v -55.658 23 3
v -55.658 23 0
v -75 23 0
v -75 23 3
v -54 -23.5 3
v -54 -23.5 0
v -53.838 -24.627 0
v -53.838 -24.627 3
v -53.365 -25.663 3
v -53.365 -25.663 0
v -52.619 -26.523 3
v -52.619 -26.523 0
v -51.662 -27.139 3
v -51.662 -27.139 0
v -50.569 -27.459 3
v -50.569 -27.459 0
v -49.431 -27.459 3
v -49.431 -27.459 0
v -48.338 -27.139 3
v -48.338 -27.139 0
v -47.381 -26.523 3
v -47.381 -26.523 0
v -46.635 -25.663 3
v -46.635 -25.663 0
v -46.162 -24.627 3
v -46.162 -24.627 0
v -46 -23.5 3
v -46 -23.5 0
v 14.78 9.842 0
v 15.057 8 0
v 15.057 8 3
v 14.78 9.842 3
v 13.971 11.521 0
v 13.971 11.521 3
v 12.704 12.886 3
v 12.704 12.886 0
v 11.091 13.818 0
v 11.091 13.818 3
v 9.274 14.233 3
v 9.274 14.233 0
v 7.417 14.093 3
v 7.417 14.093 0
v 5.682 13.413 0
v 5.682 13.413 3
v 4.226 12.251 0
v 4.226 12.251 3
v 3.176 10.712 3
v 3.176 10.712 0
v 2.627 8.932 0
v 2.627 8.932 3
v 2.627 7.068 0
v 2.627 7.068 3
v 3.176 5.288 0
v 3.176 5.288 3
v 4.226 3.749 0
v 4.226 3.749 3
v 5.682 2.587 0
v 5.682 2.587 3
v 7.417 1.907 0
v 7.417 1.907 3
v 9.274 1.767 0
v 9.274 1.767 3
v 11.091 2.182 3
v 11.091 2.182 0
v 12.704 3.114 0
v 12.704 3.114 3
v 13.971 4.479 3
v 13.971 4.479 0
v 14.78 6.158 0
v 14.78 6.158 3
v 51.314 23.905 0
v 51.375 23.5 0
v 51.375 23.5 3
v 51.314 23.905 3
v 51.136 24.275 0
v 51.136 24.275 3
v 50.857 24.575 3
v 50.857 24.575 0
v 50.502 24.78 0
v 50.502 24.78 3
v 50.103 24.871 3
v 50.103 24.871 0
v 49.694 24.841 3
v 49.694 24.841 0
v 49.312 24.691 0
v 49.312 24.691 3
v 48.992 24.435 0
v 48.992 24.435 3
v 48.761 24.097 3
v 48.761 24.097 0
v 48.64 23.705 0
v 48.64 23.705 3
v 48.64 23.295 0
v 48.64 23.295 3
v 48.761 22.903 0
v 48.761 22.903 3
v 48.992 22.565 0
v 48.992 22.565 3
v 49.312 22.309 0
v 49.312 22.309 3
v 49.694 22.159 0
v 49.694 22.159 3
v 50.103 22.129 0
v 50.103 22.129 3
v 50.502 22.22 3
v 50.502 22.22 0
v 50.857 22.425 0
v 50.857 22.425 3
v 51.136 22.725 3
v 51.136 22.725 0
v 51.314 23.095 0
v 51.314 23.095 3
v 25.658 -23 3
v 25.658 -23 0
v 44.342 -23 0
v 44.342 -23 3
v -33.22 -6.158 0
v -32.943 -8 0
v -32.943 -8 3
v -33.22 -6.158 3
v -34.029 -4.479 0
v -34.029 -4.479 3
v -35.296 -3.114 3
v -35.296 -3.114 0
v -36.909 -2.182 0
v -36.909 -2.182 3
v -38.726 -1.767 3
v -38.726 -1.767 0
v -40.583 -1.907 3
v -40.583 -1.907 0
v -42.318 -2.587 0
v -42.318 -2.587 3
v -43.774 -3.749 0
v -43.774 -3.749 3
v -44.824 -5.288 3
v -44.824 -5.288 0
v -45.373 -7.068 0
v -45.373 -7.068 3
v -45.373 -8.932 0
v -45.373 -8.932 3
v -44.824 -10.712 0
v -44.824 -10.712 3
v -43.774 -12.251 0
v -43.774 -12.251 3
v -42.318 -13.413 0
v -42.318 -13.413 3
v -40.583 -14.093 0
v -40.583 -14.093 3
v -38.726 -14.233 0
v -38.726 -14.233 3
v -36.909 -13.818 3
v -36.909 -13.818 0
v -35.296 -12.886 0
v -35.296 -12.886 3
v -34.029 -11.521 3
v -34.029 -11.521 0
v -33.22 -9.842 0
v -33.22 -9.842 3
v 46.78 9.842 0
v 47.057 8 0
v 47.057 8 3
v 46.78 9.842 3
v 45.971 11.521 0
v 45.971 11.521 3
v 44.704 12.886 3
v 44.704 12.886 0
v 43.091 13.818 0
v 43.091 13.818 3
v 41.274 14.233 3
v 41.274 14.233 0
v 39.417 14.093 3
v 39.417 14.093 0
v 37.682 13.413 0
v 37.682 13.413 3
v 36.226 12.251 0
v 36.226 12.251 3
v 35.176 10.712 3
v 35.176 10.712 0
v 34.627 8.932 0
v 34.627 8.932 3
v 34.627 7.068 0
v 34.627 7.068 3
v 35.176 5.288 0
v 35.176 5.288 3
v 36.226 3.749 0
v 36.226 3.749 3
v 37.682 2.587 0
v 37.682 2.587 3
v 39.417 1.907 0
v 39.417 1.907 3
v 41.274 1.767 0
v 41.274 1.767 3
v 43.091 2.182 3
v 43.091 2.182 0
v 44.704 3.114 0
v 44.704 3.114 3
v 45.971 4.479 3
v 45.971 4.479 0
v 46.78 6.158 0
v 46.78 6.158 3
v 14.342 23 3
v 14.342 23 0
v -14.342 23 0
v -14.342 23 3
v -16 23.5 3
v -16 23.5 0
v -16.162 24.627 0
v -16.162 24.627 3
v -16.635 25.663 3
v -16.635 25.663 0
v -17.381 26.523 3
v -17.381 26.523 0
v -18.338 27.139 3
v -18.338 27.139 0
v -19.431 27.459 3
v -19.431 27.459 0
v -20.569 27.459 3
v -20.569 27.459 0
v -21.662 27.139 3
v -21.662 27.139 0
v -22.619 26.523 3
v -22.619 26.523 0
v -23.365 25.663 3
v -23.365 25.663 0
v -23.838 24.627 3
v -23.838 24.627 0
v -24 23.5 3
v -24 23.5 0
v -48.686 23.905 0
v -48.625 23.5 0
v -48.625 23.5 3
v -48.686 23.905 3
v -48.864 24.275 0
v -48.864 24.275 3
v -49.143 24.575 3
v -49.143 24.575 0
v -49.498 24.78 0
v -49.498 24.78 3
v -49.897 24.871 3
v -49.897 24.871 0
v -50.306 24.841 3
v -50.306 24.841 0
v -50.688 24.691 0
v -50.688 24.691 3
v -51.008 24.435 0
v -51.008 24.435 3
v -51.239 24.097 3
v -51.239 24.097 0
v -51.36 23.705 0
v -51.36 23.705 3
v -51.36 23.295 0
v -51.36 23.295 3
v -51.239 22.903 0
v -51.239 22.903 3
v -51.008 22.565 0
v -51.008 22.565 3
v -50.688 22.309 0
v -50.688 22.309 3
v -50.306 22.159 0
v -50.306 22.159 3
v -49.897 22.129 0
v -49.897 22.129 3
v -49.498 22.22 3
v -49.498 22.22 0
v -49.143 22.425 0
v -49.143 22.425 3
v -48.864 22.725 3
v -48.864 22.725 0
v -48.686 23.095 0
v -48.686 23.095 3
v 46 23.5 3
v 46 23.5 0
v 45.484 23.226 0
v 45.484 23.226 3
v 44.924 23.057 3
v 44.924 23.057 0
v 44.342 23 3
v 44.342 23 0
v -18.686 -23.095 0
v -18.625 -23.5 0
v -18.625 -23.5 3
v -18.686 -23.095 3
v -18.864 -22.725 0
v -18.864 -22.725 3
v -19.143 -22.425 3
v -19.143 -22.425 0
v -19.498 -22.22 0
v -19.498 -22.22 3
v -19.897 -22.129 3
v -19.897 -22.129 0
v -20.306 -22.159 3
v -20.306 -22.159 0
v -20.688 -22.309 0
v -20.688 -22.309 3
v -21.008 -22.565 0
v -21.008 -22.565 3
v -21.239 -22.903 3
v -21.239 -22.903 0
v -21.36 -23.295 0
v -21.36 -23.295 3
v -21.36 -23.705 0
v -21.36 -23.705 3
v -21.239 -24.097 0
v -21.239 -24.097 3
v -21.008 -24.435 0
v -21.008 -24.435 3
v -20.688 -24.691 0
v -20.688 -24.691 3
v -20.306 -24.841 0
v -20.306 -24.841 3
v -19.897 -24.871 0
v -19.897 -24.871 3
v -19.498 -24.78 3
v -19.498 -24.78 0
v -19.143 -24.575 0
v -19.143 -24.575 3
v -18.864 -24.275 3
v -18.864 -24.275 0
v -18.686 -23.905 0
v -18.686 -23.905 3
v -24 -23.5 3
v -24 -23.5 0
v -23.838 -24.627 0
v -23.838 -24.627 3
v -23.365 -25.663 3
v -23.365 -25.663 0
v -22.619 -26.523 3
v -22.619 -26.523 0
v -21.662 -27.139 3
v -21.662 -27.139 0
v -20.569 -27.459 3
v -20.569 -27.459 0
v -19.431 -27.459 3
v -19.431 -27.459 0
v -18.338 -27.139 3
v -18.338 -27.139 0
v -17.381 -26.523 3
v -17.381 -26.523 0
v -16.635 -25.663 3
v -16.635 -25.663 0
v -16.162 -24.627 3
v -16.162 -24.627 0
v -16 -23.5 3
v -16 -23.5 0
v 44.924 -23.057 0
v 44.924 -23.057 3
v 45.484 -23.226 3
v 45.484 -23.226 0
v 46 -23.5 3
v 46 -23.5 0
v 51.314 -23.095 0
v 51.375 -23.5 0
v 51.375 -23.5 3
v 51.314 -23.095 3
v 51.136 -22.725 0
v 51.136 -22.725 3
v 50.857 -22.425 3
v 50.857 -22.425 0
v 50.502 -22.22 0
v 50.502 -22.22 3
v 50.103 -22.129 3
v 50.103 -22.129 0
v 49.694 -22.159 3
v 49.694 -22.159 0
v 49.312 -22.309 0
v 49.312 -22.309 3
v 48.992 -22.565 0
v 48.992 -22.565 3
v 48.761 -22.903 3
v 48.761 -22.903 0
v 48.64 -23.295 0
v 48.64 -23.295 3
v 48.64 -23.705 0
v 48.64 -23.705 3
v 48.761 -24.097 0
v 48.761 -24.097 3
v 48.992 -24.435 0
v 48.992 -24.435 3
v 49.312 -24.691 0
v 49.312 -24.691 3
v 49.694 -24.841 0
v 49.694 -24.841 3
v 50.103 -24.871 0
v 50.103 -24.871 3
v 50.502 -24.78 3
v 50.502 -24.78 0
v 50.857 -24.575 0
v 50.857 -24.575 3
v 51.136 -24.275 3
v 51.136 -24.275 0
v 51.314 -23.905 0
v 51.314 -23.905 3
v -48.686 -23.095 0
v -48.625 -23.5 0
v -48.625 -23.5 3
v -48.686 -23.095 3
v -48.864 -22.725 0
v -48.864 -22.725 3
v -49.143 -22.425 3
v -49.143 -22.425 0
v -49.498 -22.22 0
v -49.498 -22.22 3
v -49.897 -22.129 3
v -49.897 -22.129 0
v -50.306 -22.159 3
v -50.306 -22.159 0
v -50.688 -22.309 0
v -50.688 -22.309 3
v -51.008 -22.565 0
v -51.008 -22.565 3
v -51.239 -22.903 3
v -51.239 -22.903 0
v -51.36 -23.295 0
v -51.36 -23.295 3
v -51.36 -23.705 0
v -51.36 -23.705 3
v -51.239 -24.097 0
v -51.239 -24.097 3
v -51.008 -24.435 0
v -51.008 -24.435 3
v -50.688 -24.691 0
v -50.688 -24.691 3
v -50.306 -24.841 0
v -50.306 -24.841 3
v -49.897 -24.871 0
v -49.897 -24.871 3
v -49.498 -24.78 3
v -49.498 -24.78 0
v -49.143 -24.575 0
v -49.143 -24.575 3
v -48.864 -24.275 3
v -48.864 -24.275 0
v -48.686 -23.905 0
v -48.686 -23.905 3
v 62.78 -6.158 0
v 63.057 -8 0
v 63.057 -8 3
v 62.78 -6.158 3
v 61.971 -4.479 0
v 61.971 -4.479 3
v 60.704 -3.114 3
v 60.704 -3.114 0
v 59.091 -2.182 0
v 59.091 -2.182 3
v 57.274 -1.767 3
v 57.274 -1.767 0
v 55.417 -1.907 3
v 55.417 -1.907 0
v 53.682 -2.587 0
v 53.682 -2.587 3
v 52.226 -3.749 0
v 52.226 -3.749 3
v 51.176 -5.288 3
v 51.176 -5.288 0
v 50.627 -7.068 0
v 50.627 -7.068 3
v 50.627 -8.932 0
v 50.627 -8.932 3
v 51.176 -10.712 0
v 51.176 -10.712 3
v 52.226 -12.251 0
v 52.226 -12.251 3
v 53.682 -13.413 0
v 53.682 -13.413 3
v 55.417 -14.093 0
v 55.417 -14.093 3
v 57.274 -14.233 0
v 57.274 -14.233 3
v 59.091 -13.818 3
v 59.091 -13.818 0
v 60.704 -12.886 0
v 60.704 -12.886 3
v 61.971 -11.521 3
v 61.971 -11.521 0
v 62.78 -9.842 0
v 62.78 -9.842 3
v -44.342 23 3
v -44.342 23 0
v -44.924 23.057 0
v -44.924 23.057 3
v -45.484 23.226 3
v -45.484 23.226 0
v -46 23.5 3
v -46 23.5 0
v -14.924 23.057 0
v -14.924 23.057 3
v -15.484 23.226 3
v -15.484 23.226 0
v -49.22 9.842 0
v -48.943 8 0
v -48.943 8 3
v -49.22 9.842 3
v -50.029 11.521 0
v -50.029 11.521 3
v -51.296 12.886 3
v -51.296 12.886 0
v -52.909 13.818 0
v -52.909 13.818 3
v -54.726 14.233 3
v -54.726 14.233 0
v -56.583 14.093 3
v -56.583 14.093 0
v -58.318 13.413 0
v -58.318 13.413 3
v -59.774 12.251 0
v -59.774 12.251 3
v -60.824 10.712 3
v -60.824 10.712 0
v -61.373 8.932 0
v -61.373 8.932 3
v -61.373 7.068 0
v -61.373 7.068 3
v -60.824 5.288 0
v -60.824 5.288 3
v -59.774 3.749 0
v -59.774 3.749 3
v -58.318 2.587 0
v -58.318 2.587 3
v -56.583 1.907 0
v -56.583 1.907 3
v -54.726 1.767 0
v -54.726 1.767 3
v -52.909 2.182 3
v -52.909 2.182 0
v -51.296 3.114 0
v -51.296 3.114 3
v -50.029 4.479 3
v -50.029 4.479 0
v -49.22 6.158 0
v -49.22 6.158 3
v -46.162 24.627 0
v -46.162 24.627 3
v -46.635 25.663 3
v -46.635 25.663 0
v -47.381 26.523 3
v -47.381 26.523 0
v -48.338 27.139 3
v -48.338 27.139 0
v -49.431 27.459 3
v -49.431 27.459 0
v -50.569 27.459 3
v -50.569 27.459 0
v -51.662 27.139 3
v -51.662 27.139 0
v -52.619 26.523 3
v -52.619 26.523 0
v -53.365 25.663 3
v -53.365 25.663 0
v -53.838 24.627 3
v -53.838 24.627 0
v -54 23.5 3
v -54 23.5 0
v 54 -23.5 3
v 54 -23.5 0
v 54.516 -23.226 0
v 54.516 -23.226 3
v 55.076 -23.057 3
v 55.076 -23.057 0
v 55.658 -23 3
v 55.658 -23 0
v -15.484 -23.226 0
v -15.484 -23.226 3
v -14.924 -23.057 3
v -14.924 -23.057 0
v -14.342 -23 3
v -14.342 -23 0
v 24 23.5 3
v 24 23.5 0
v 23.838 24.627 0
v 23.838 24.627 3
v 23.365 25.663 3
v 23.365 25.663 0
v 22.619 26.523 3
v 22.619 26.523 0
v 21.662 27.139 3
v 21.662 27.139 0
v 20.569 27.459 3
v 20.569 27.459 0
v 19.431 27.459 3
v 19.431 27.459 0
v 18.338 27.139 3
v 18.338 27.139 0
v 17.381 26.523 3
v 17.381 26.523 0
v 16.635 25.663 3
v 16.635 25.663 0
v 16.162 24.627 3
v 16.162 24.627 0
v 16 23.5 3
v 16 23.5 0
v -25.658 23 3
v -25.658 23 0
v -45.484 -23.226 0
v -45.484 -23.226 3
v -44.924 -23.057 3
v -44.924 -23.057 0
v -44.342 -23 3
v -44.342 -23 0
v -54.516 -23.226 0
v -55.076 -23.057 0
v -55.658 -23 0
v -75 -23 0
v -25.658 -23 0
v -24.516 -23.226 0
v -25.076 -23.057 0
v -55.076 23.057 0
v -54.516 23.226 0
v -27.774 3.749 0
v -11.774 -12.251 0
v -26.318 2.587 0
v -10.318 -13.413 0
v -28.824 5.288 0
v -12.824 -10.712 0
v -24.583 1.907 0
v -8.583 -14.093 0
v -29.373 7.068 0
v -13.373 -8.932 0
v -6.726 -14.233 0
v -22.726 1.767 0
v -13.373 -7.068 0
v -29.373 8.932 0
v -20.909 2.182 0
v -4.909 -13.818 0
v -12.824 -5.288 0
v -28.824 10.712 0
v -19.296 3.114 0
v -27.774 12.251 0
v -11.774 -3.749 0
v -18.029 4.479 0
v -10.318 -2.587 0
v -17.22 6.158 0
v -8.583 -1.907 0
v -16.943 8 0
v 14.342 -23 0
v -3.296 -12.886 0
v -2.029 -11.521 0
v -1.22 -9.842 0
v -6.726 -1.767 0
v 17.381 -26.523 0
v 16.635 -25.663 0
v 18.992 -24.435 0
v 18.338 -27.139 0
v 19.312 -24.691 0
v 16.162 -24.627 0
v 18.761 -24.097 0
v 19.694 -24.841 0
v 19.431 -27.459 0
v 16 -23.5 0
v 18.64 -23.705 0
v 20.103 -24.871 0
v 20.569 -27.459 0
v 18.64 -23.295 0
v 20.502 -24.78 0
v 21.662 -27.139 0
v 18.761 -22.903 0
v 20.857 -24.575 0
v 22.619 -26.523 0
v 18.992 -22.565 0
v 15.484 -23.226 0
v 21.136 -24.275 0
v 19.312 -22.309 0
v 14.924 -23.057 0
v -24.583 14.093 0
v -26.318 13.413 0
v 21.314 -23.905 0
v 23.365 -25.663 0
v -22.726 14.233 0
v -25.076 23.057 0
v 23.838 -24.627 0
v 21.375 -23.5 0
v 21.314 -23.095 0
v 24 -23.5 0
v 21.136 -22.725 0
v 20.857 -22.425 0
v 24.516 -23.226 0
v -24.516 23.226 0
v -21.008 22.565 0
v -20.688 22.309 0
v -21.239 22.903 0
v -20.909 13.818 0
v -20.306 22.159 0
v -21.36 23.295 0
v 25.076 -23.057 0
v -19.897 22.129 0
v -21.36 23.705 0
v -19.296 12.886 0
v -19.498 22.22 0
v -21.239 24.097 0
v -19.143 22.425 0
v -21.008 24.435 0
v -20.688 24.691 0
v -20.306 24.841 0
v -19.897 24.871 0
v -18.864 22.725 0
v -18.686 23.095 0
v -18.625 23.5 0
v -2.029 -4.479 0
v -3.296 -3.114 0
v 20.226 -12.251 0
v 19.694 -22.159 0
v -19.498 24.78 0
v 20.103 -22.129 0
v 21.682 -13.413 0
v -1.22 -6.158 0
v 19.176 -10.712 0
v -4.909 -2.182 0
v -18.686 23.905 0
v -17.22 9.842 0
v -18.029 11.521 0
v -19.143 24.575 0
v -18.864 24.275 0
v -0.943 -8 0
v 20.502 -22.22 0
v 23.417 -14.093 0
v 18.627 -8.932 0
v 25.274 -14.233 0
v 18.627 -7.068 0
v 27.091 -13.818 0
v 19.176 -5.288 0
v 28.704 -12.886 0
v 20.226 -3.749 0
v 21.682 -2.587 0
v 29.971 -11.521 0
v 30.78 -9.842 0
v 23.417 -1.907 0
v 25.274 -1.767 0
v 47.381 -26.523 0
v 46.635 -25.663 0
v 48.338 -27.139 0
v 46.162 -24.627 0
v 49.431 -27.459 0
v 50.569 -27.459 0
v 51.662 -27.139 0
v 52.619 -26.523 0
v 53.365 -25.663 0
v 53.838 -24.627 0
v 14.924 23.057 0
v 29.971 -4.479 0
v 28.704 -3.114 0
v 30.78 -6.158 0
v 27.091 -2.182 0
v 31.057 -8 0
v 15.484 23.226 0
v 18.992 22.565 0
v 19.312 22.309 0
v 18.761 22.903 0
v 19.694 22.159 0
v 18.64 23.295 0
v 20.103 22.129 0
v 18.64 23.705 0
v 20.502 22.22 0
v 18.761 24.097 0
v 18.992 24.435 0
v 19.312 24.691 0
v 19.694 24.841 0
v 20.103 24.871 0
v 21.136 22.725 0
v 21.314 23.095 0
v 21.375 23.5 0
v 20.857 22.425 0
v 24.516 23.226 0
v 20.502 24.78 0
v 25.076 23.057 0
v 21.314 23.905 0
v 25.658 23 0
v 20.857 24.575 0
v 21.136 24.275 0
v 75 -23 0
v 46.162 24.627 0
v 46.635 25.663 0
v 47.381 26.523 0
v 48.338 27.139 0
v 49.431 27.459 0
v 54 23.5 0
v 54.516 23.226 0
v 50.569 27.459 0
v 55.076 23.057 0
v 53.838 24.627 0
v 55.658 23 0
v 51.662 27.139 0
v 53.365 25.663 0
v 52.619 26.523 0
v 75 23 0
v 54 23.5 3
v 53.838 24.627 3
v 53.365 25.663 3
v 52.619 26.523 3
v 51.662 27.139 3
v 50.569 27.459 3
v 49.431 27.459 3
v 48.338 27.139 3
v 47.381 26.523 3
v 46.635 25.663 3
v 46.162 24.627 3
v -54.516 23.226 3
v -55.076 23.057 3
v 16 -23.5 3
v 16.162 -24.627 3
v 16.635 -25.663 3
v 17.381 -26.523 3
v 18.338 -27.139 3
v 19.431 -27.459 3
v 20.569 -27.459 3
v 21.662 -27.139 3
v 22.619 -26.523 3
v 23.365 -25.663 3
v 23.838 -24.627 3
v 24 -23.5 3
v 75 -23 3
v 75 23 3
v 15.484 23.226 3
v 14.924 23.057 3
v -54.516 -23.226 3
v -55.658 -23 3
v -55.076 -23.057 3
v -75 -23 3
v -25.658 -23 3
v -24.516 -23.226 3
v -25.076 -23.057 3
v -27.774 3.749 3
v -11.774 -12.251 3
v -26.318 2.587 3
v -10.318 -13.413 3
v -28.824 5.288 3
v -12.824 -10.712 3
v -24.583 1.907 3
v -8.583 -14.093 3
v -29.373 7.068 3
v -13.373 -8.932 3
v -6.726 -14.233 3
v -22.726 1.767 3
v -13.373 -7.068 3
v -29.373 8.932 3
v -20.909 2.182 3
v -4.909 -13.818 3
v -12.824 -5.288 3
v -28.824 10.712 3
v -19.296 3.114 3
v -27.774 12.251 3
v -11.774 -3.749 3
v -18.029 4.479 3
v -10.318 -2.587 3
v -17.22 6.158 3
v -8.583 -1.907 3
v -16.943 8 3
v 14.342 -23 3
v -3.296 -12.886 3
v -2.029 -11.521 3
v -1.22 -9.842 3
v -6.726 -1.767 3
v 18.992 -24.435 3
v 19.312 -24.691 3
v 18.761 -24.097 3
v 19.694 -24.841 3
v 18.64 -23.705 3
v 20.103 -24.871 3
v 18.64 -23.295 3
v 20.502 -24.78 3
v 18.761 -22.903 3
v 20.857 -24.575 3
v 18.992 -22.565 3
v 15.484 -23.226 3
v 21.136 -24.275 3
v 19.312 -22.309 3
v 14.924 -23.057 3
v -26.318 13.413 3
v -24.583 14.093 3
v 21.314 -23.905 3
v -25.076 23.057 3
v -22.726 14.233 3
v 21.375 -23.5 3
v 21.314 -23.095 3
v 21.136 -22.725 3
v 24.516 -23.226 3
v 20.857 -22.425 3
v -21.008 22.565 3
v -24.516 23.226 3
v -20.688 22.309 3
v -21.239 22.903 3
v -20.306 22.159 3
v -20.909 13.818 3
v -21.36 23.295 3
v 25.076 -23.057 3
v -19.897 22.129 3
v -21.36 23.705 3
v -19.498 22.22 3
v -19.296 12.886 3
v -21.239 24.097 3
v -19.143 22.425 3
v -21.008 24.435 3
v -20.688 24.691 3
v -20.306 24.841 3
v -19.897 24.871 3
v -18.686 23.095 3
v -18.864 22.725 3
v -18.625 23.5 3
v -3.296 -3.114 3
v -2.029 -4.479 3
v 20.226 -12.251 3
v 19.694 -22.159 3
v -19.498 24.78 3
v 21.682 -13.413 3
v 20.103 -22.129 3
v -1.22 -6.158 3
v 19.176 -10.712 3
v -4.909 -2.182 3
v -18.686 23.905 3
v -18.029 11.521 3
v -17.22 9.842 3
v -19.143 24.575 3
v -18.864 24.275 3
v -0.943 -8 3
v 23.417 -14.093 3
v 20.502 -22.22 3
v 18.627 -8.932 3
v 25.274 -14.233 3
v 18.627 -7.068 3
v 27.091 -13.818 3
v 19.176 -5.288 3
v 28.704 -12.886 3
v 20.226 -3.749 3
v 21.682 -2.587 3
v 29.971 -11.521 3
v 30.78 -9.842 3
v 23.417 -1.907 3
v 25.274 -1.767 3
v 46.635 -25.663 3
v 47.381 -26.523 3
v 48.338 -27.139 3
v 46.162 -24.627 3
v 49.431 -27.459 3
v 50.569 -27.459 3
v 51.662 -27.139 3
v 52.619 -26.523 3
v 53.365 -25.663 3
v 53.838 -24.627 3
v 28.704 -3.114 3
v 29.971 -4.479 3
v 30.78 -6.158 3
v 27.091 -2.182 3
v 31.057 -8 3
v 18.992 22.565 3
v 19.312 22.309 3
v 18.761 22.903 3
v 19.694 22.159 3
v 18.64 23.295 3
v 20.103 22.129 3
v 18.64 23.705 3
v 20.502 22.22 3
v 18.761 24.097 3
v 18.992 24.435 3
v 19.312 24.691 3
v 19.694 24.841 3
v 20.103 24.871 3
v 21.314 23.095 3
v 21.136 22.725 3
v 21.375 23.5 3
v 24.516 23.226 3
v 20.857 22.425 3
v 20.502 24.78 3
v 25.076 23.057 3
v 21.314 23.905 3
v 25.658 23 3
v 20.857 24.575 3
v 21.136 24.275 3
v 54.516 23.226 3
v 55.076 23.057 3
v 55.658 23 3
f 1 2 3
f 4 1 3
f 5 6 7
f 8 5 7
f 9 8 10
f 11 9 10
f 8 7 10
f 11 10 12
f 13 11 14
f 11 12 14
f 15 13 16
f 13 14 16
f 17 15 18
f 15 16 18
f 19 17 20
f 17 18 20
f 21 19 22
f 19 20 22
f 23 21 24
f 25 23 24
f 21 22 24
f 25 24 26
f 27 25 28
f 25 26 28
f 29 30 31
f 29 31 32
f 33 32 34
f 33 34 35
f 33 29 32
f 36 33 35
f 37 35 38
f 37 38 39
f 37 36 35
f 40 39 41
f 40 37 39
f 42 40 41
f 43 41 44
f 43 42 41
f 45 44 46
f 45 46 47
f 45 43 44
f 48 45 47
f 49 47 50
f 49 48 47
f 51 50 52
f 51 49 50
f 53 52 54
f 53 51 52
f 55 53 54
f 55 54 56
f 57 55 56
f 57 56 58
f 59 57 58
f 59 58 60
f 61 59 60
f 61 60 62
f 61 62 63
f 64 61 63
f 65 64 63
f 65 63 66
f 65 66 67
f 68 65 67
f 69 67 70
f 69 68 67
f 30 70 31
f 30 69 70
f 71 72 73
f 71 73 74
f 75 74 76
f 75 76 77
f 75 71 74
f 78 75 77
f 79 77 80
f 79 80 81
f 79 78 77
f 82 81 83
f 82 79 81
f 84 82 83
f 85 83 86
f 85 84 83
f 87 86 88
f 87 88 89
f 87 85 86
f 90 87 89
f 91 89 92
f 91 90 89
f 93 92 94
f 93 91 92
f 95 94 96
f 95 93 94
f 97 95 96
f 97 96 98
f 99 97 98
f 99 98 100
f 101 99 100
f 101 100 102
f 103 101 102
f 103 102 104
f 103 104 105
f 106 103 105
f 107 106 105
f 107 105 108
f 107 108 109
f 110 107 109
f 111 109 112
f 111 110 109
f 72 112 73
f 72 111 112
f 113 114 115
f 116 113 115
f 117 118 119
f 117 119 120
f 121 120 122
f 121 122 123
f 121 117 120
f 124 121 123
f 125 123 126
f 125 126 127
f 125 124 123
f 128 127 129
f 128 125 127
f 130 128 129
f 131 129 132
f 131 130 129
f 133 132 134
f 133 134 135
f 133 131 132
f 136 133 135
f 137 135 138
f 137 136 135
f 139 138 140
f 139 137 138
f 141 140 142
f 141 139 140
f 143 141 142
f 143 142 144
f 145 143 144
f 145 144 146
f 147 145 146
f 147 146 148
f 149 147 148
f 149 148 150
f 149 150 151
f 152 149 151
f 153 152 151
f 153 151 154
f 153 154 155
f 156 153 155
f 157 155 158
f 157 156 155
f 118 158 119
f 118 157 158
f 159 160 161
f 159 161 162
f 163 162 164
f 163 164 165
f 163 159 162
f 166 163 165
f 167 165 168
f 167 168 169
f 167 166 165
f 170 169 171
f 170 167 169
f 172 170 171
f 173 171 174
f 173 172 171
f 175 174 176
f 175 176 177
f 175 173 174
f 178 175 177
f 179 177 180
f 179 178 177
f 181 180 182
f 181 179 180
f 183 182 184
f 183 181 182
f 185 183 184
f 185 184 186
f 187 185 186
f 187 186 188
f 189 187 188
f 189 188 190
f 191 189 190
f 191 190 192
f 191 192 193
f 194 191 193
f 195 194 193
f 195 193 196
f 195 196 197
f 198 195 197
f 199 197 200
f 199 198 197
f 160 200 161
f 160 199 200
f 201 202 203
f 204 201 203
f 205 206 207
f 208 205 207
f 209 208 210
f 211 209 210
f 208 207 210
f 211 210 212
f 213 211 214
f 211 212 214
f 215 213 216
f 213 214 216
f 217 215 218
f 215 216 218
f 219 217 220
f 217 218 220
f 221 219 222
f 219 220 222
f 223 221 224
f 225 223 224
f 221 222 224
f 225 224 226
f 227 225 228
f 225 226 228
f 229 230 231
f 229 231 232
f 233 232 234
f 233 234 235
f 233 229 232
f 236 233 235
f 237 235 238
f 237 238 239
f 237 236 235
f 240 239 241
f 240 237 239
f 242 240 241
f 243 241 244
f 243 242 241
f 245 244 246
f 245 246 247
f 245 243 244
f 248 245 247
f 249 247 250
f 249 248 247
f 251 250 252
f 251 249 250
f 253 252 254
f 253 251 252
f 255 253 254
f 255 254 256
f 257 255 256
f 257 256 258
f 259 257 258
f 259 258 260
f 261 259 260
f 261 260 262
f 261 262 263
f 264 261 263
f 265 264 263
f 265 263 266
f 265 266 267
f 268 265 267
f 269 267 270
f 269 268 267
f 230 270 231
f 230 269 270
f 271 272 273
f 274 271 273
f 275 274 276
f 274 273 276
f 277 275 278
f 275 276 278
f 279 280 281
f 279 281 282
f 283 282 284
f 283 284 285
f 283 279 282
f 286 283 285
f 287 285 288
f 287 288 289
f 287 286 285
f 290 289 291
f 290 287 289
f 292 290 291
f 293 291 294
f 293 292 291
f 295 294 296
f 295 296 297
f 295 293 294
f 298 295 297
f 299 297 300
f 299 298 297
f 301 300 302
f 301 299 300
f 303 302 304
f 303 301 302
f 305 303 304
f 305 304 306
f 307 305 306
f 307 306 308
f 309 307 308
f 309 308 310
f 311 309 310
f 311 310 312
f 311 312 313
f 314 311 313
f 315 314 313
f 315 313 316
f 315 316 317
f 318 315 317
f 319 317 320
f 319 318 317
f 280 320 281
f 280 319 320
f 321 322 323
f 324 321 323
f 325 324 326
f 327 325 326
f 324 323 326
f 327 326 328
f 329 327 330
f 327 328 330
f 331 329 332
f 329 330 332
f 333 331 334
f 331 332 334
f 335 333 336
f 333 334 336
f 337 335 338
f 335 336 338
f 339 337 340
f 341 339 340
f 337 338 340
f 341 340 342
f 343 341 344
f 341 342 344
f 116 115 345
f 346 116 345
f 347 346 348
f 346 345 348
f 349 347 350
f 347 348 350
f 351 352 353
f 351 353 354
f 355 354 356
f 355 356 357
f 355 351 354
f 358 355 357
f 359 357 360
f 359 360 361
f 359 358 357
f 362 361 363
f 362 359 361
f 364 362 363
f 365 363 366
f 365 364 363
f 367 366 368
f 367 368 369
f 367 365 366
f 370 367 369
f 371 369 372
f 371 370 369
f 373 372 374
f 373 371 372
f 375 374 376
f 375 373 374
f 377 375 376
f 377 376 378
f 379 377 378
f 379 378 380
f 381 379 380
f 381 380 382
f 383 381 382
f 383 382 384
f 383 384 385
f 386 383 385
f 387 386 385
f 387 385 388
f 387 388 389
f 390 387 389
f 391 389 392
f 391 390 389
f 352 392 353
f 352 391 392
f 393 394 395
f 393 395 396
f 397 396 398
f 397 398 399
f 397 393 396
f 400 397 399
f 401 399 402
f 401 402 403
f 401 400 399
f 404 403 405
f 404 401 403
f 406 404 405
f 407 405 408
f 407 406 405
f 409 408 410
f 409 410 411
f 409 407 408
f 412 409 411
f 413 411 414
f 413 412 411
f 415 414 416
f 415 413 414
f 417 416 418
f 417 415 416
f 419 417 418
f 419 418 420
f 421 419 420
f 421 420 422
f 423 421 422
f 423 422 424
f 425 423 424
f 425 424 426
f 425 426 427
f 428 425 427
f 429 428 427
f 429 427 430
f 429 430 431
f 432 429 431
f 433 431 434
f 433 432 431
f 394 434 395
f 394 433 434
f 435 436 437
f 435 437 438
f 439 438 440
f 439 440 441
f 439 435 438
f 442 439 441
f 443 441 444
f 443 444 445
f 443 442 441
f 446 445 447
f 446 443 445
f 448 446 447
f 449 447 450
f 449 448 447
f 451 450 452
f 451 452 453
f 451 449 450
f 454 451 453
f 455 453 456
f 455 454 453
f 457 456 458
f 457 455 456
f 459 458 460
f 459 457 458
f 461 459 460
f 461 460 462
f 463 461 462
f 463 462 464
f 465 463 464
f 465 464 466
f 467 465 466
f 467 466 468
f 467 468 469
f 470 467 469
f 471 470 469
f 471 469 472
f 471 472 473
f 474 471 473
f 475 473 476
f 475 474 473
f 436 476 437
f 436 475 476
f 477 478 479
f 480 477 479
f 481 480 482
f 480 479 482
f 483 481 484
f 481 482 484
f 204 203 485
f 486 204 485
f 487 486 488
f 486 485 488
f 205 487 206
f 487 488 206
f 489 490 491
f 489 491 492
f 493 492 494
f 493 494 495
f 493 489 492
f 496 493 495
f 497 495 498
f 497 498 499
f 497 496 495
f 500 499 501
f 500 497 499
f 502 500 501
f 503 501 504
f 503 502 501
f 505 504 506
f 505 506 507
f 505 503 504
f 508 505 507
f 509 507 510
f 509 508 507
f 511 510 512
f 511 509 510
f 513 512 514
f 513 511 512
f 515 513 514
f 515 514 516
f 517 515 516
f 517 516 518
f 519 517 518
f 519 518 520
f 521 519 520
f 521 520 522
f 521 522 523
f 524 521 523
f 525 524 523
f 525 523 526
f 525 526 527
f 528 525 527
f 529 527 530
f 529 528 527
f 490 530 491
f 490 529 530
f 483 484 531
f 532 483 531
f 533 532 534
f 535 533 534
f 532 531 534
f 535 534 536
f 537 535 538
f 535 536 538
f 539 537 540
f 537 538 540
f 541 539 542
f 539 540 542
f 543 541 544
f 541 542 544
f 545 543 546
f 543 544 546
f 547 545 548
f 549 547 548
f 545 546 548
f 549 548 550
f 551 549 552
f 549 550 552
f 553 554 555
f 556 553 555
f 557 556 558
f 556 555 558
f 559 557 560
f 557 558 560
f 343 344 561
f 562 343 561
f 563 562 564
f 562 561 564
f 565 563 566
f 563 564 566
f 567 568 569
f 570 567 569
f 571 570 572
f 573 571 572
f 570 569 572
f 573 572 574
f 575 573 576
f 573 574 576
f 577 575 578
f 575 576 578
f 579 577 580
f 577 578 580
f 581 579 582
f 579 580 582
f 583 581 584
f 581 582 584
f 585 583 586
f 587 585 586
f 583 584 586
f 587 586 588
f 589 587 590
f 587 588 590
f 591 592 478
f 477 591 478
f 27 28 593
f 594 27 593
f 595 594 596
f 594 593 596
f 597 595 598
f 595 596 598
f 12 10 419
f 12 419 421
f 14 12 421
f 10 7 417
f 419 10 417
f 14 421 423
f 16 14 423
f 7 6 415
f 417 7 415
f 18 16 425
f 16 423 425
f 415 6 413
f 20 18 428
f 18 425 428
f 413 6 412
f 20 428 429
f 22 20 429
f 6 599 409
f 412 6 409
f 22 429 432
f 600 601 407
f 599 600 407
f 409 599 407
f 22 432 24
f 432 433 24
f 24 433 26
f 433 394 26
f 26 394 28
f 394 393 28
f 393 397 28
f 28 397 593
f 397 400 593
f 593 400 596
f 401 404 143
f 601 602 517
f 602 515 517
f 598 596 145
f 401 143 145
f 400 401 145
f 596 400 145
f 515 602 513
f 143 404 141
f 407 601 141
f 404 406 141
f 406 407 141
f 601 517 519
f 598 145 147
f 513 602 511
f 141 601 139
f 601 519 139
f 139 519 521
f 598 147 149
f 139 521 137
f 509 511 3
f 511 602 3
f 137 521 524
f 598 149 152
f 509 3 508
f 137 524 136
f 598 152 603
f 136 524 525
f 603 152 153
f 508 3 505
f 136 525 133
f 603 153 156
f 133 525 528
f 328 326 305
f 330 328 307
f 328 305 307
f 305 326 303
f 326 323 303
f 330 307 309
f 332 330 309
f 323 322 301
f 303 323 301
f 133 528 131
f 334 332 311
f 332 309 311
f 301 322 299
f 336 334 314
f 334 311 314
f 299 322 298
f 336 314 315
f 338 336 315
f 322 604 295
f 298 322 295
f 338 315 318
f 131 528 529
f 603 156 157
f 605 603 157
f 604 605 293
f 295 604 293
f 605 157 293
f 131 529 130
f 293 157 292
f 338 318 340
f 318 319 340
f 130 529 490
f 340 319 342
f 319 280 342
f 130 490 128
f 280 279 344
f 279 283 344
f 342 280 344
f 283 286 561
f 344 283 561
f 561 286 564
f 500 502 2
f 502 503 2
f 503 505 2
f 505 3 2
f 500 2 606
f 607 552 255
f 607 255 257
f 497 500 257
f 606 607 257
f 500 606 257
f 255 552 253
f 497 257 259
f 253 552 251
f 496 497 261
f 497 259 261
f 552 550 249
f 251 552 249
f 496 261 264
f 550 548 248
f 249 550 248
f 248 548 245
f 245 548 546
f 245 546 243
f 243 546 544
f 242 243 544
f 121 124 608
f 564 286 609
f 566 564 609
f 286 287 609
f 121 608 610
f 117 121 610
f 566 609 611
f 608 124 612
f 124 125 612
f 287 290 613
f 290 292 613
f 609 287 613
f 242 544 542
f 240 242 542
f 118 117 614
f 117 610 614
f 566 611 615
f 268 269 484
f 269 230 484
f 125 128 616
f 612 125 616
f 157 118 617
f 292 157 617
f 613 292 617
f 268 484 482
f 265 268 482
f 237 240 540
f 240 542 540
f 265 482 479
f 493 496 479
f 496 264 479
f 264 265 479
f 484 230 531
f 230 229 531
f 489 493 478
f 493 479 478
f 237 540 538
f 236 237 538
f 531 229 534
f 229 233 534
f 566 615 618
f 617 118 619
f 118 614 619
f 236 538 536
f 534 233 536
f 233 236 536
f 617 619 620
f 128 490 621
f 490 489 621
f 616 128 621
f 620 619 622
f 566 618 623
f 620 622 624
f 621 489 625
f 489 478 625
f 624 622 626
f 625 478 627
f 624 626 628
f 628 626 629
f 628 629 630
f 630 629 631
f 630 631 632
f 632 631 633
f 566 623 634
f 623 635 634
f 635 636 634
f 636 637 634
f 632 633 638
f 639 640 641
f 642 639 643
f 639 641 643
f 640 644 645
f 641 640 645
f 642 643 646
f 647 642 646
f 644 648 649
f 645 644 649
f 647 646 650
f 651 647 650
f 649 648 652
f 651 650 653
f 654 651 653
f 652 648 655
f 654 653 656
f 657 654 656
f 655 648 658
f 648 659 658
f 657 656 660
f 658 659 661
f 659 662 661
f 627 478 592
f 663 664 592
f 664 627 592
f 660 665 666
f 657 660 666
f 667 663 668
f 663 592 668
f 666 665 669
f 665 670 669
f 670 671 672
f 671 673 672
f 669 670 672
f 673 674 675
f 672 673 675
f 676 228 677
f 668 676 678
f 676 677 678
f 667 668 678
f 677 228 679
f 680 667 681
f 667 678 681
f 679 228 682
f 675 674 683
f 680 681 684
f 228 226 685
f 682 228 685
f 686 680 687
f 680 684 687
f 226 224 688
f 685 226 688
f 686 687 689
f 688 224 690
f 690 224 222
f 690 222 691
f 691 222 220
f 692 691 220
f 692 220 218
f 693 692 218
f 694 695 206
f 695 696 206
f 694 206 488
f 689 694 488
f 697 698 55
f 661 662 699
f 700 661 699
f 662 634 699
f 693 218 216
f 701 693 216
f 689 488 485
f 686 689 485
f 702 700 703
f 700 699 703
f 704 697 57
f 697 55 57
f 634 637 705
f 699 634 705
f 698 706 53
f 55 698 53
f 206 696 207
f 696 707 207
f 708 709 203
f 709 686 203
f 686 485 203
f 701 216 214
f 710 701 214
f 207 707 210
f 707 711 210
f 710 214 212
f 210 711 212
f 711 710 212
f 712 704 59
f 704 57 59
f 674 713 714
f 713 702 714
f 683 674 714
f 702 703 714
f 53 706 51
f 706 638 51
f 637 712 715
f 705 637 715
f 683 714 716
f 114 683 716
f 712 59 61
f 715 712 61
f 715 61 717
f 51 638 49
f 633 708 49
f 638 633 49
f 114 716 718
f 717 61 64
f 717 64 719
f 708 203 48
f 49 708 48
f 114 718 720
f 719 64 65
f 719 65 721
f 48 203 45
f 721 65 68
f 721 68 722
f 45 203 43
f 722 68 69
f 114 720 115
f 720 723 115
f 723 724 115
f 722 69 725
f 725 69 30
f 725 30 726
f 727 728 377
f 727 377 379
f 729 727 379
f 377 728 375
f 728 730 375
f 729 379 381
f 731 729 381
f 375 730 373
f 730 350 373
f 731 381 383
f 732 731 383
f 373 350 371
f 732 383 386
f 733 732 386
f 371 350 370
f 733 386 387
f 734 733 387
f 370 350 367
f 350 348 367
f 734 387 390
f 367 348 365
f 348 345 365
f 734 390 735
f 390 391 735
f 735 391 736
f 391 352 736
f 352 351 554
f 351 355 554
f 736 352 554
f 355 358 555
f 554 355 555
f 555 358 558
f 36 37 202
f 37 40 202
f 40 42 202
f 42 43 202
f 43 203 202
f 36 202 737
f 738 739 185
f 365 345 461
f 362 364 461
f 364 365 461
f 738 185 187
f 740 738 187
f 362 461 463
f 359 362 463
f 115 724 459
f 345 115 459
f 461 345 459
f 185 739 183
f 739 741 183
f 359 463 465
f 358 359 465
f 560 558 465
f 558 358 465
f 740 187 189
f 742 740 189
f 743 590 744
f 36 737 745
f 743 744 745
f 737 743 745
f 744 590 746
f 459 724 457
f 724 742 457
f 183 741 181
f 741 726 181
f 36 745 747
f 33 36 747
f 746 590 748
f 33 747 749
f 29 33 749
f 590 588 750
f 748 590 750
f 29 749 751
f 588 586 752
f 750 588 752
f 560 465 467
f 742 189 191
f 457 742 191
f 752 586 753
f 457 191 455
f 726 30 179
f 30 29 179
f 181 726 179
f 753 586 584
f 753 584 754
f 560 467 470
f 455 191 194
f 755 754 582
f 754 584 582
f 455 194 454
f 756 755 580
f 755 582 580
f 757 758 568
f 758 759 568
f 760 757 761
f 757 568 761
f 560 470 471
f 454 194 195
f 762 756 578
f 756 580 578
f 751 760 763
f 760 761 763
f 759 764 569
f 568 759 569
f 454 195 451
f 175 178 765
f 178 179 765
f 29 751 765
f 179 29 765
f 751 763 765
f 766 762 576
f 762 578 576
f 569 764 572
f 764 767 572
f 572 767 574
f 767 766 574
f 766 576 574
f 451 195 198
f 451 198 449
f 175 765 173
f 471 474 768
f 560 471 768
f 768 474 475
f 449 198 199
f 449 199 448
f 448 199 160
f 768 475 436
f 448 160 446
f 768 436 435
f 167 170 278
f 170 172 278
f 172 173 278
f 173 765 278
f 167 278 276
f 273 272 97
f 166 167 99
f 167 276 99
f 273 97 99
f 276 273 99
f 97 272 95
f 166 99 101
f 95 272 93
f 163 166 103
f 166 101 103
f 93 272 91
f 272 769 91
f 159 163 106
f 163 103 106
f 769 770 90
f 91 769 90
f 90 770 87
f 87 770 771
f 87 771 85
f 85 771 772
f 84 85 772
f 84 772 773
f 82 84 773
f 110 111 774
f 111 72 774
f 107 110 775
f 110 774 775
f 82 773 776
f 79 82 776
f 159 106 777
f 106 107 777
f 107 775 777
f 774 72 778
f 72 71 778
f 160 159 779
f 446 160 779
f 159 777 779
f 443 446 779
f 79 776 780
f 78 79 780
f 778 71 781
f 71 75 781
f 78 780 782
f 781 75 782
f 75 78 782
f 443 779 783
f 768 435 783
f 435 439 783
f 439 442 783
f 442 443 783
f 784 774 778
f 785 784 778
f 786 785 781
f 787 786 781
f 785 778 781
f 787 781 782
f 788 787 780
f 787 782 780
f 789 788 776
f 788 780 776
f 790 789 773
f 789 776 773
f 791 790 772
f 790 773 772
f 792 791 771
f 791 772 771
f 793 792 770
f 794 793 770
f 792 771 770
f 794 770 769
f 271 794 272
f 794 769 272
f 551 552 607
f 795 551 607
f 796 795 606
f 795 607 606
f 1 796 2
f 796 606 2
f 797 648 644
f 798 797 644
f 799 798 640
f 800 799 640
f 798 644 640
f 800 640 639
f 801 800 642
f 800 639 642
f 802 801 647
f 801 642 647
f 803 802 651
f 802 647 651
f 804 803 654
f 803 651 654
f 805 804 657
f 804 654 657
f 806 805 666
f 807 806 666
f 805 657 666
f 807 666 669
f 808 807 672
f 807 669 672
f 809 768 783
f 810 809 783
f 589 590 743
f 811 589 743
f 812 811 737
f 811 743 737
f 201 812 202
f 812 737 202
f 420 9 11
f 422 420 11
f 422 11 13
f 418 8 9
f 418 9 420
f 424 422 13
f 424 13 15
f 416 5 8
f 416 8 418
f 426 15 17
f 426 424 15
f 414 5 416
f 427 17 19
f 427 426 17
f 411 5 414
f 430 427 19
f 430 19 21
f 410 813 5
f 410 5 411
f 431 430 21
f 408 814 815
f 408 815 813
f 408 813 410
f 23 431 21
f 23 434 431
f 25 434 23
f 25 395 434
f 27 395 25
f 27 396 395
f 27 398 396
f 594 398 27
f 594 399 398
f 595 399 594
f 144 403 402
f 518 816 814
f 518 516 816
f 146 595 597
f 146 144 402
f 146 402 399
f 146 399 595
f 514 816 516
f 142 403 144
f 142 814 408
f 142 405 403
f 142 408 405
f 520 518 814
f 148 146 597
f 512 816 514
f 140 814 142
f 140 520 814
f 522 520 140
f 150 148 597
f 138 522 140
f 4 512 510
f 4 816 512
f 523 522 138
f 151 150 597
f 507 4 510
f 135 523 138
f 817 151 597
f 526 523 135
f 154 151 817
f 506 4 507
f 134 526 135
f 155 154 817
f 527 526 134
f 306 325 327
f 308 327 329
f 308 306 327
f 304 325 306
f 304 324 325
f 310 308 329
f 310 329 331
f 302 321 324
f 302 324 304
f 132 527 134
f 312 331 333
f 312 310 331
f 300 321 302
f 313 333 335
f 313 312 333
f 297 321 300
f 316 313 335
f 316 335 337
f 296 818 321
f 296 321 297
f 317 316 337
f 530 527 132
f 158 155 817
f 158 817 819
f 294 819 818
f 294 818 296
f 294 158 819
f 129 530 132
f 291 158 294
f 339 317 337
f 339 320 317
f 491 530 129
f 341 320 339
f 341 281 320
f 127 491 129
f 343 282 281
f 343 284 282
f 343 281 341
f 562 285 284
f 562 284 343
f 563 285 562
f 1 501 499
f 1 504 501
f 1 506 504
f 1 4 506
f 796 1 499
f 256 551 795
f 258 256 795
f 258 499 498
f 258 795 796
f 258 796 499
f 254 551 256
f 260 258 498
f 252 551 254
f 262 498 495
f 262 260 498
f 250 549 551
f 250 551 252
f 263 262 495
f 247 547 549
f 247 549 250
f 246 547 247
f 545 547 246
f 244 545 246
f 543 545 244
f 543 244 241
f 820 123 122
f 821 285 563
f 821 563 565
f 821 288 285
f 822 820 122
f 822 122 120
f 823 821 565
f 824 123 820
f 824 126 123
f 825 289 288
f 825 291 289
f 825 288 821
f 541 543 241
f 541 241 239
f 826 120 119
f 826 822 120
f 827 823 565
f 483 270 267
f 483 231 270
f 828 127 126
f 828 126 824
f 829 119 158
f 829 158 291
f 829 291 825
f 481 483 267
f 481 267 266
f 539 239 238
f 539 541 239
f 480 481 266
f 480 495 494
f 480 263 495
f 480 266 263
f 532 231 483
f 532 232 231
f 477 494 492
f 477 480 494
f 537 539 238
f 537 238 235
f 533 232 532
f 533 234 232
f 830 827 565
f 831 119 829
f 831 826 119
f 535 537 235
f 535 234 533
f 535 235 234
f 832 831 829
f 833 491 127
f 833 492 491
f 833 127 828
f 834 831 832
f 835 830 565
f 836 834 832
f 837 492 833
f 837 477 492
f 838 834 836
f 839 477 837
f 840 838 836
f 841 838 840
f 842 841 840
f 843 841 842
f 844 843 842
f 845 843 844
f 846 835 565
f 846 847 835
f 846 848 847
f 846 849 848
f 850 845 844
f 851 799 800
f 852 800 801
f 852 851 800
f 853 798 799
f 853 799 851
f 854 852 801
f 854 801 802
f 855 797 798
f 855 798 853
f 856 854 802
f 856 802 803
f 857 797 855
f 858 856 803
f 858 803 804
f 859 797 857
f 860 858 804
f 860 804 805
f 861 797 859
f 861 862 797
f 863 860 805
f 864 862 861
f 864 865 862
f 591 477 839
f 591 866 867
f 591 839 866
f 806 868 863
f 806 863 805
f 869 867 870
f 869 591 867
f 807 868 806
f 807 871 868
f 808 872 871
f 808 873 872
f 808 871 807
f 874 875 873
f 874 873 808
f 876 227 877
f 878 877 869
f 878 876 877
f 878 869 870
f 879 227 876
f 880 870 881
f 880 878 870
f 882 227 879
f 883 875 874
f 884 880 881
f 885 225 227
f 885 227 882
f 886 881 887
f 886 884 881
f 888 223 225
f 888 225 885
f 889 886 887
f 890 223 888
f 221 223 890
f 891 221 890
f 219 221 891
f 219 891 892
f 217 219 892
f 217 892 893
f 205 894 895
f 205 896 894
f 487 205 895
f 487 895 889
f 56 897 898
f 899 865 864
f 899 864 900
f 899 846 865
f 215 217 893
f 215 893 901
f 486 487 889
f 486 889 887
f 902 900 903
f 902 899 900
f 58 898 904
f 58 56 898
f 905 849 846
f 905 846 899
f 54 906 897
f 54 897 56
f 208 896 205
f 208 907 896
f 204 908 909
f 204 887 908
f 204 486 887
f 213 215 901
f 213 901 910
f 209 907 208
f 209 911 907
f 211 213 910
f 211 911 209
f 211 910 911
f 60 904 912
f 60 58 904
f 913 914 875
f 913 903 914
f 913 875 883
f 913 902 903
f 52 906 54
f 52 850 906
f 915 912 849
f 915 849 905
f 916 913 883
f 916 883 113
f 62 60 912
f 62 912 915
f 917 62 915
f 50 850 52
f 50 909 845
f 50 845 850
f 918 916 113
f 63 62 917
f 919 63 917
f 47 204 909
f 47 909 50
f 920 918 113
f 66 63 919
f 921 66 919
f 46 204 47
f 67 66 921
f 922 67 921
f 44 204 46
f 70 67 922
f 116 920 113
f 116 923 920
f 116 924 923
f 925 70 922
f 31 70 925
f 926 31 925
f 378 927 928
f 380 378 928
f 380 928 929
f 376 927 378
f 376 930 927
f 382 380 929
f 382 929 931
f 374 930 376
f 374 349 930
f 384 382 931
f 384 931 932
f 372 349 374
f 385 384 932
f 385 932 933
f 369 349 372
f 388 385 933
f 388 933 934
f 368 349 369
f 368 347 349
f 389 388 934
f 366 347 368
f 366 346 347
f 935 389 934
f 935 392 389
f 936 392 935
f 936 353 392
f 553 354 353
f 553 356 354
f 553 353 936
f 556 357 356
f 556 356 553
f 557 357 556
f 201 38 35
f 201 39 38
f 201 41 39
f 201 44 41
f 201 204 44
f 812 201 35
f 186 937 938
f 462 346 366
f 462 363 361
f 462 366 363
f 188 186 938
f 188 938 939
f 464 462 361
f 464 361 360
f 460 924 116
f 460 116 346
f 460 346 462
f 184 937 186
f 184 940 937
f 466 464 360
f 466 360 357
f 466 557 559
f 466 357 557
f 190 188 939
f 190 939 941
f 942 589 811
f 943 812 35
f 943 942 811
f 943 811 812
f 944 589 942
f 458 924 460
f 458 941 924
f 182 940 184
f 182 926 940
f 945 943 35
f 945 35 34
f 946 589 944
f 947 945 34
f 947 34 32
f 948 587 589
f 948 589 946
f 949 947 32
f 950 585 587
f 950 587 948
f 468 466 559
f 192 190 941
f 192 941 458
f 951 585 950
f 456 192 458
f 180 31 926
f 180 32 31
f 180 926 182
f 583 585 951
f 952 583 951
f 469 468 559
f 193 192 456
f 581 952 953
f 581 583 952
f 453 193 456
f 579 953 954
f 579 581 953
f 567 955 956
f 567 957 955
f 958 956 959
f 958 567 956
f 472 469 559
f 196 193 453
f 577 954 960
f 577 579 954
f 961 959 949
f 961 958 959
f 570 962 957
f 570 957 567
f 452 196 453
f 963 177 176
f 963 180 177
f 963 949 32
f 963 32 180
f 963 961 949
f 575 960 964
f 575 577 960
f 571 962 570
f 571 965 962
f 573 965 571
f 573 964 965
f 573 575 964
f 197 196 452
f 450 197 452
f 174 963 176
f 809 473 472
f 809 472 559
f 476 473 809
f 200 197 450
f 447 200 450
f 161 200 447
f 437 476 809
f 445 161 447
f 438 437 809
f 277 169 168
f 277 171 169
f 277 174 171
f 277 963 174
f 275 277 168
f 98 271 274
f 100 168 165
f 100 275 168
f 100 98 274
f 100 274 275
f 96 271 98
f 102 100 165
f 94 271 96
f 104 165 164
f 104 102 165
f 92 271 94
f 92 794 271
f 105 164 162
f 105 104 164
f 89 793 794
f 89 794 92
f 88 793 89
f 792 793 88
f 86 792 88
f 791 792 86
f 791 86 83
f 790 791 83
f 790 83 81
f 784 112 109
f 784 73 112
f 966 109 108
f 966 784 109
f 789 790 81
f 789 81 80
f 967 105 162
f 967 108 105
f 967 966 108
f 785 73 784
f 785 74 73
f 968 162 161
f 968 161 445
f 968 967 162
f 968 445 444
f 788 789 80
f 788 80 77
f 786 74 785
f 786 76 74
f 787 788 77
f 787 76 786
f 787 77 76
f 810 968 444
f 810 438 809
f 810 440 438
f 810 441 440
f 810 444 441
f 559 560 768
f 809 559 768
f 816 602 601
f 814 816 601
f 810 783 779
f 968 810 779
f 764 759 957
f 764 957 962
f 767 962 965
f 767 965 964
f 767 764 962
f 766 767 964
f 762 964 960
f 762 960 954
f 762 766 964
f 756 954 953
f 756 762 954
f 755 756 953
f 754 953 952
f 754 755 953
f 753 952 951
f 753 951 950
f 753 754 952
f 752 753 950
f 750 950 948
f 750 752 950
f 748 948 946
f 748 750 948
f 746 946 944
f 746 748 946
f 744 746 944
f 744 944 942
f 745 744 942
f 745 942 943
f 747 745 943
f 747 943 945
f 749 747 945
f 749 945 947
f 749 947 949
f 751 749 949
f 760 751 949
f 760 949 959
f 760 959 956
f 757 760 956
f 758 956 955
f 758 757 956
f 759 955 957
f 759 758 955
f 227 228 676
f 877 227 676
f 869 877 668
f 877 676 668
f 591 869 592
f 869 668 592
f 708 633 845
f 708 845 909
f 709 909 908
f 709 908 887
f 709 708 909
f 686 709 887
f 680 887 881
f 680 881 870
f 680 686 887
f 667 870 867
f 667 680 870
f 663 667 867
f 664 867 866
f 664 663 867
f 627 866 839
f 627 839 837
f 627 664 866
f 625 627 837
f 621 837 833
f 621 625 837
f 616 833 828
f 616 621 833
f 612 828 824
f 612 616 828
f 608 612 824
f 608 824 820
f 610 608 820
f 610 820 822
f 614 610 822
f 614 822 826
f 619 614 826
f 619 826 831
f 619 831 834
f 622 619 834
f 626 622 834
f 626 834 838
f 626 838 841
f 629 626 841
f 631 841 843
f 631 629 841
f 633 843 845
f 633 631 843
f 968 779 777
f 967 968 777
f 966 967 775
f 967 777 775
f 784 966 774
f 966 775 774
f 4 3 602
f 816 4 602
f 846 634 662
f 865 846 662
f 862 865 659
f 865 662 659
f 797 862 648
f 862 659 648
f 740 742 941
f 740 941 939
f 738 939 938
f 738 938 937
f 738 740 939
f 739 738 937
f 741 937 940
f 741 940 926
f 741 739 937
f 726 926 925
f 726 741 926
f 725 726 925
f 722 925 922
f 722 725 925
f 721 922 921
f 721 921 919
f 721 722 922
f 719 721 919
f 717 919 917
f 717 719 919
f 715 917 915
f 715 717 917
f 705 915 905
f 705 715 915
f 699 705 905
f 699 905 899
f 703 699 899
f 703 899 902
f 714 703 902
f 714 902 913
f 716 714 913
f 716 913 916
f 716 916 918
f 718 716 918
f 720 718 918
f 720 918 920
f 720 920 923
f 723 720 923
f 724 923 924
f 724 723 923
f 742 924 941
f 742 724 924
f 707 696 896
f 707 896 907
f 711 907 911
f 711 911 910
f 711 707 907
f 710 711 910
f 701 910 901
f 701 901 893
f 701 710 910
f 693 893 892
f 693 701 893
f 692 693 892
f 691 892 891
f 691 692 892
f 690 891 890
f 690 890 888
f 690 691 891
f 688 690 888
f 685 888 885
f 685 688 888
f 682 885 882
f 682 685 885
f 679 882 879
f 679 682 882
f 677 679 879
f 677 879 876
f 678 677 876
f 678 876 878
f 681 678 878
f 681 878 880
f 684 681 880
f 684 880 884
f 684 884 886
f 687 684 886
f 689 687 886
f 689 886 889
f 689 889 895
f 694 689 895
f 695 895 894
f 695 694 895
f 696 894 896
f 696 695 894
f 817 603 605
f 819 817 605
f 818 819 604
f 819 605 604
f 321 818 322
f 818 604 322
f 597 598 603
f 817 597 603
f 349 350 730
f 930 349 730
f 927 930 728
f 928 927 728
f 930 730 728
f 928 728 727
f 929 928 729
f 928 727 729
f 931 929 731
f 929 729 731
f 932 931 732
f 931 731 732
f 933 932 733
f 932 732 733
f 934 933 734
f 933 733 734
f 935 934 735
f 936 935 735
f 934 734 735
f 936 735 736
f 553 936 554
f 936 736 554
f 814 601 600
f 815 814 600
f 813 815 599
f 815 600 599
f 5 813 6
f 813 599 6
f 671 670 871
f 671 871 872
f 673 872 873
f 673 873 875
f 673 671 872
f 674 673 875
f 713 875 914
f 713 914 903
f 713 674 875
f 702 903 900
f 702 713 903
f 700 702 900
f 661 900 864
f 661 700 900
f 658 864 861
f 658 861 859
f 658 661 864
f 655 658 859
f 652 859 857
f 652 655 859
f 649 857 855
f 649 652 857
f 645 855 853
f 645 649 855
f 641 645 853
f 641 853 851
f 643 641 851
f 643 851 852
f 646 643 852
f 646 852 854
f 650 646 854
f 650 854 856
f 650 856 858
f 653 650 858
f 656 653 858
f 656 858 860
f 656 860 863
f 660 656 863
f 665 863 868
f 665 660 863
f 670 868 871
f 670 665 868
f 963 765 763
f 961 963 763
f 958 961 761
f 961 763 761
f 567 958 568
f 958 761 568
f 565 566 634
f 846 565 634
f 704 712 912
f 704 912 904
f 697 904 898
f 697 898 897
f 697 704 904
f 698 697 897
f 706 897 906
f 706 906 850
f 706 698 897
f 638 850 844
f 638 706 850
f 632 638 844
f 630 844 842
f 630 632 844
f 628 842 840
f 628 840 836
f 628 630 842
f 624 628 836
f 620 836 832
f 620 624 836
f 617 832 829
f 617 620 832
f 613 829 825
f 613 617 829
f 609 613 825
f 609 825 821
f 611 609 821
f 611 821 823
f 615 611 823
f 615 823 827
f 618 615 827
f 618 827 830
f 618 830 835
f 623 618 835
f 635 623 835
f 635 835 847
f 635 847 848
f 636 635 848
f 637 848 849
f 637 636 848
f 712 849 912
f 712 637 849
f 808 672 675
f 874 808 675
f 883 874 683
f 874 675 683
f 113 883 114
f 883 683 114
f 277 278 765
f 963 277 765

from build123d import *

# Parameters (mm, degrees)
SKETCH1_R           = 1.375
SKETCH1_R_2         = 6.25
BOSS_EXTRUDE1_DEPTH = 3


with BuildPart() as part:
    # Sketch1 → Boss-Extrude1 (new body)
    with BuildSketch(Plane.XY):
        with BuildLine():
            Line((-75, 23), (-75, -23))
            Line((-75, -23), (-55.658312395, -23))
            ThreePointArc((-55.658312395, -23), (-54.792286991, -23.127718677), (-54, -23.5))
            ThreePointArc((-54, -23.5), (-50, -27.5), (-46, -23.5))
            ThreePointArc((-46, -23.5), (-45.207713009, -23.127718677), (-44.341687605, -23))
            Line((-44.341687605, -23), (-25.658312395, -23))
            ThreePointArc((-25.658312395, -23), (-24.792286991, -23.127718677), (-24, -23.5))
            ThreePointArc((-24, -23.5), (-20, -27.5), (-16, -23.5))
            ThreePointArc((-16, -23.5), (-15.207713009, -23.127718677), (-14.341687605, -23))
            Line((-14.341687605, -23), (14.341687605, -23))
            ThreePointArc((14.341687605, -23), (15.207713009, -23.127718677), (16, -23.5))
            ThreePointArc((16, -23.5), (20, -27.5), (24, -23.5))
            ThreePointArc((24, -23.5), (24.792286991, -23.127718677), (25.658312395, -23))
            Line((25.658312395, -23), (44.341687605, -23))
            ThreePointArc((44.341687605, -23), (45.207713009, -23.127718677), (46, -23.5))
            ThreePointArc((46, -23.5), (50, -27.5), (54, -23.5))
            ThreePointArc((54, -23.5), (54.792286991, -23.127718677), (55.658312395, -23))
            Line((55.658312395, -23), (75, -23))
            Line((75, -23), (75, 23))
            Line((75, 23), (55.658312395, 23))
            ThreePointArc((55.658312395, 23), (54.792286991, 23.127718677), (54, 23.5))
            ThreePointArc((54, 23.5), (50, 27.5), (46, 23.5))
            ThreePointArc((46, 23.5), (45.207713009, 23.127718677), (44.341687605, 23))
            Line((44.341687605, 23), (25.658312395, 23))
            ThreePointArc((25.658312395, 23), (24.792286991, 23.127718677), (24, 23.5))
            ThreePointArc((24, 23.5), (20, 27.5), (16, 23.5))
            ThreePointArc((16, 23.5), (15.207713009, 23.127718677), (14.341687605, 23))
            Line((14.341687605, 23), (-14.341687605, 23))
            ThreePointArc((-14.341687605, 23), (-15.207713009, 23.127718677), (-16, 23.5))
            ThreePointArc((-16, 23.5), (-20, 27.5), (-24, 23.5))
            ThreePointArc((-24, 23.5), (-24.792286991, 23.127718677), (-25.658312395, 23))
            Line((-25.658312395, 23), (-44.341687605, 23))
            ThreePointArc((-44.341687605, 23), (-45.207713009, 23.127718677), (-46, 23.5))
            ThreePointArc((-46, 23.5), (-50, 27.5), (-54, 23.5))
            ThreePointArc((-54, 23.5), (-54.792286991, 23.127718677), (-55.658312395, 23))
            Line((-55.658312395, 23), (-75, 23))
        make_face()
        with Locations((-50, -23.5)):
            Circle(SKETCH1_R, mode=Mode.SUBTRACT)
        with Locations((-20, -23.5)):
            Circle(SKETCH1_R, mode=Mode.SUBTRACT)
        with Locations((20, -23.5)):
            Circle(SKETCH1_R, mode=Mode.SUBTRACT)
        with Locations((50, -23.5)):
            Circle(SKETCH1_R, mode=Mode.SUBTRACT)
        with Locations((50, 23.5)):
            Circle(SKETCH1_R, mode=Mode.SUBTRACT)
        with Locations((20, 23.5)):
            Circle(SKETCH1_R, mode=Mode.SUBTRACT)
        with Locations((-20, 23.5)):
            Circle(SKETCH1_R, mode=Mode.SUBTRACT)
        with Locations((-50, 23.5)):
            Circle(SKETCH1_R, mode=Mode.SUBTRACT)
        with Locations((-55.192693601, 8)):
            Circle(SKETCH1_R_2, mode=Mode.SUBTRACT)
        with Locations((-23.192693601, 8)):
            Circle(SKETCH1_R_2, mode=Mode.SUBTRACT)
        with Locations((8.807306399, 8)):
            Circle(SKETCH1_R_2, mode=Mode.SUBTRACT)
        with Locations((40.807306399, 8)):
            Circle(SKETCH1_R_2, mode=Mode.SUBTRACT)
        with Locations((-39.192693601, -8)):
            Circle(SKETCH1_R_2, mode=Mode.SUBTRACT)
        with Locations((-7.192693601, -8)):
            Circle(SKETCH1_R_2, mode=Mode.SUBTRACT)
        with Locations((24.807306399, -8)):
            Circle(SKETCH1_R_2, mode=Mode.SUBTRACT)
        with Locations((56.807306399, -8)):
            Circle(SKETCH1_R_2, mode=Mode.SUBTRACT)
    extrude(amount=BOSS_EXTRUDE1_DEPTH)


solid = part.part
